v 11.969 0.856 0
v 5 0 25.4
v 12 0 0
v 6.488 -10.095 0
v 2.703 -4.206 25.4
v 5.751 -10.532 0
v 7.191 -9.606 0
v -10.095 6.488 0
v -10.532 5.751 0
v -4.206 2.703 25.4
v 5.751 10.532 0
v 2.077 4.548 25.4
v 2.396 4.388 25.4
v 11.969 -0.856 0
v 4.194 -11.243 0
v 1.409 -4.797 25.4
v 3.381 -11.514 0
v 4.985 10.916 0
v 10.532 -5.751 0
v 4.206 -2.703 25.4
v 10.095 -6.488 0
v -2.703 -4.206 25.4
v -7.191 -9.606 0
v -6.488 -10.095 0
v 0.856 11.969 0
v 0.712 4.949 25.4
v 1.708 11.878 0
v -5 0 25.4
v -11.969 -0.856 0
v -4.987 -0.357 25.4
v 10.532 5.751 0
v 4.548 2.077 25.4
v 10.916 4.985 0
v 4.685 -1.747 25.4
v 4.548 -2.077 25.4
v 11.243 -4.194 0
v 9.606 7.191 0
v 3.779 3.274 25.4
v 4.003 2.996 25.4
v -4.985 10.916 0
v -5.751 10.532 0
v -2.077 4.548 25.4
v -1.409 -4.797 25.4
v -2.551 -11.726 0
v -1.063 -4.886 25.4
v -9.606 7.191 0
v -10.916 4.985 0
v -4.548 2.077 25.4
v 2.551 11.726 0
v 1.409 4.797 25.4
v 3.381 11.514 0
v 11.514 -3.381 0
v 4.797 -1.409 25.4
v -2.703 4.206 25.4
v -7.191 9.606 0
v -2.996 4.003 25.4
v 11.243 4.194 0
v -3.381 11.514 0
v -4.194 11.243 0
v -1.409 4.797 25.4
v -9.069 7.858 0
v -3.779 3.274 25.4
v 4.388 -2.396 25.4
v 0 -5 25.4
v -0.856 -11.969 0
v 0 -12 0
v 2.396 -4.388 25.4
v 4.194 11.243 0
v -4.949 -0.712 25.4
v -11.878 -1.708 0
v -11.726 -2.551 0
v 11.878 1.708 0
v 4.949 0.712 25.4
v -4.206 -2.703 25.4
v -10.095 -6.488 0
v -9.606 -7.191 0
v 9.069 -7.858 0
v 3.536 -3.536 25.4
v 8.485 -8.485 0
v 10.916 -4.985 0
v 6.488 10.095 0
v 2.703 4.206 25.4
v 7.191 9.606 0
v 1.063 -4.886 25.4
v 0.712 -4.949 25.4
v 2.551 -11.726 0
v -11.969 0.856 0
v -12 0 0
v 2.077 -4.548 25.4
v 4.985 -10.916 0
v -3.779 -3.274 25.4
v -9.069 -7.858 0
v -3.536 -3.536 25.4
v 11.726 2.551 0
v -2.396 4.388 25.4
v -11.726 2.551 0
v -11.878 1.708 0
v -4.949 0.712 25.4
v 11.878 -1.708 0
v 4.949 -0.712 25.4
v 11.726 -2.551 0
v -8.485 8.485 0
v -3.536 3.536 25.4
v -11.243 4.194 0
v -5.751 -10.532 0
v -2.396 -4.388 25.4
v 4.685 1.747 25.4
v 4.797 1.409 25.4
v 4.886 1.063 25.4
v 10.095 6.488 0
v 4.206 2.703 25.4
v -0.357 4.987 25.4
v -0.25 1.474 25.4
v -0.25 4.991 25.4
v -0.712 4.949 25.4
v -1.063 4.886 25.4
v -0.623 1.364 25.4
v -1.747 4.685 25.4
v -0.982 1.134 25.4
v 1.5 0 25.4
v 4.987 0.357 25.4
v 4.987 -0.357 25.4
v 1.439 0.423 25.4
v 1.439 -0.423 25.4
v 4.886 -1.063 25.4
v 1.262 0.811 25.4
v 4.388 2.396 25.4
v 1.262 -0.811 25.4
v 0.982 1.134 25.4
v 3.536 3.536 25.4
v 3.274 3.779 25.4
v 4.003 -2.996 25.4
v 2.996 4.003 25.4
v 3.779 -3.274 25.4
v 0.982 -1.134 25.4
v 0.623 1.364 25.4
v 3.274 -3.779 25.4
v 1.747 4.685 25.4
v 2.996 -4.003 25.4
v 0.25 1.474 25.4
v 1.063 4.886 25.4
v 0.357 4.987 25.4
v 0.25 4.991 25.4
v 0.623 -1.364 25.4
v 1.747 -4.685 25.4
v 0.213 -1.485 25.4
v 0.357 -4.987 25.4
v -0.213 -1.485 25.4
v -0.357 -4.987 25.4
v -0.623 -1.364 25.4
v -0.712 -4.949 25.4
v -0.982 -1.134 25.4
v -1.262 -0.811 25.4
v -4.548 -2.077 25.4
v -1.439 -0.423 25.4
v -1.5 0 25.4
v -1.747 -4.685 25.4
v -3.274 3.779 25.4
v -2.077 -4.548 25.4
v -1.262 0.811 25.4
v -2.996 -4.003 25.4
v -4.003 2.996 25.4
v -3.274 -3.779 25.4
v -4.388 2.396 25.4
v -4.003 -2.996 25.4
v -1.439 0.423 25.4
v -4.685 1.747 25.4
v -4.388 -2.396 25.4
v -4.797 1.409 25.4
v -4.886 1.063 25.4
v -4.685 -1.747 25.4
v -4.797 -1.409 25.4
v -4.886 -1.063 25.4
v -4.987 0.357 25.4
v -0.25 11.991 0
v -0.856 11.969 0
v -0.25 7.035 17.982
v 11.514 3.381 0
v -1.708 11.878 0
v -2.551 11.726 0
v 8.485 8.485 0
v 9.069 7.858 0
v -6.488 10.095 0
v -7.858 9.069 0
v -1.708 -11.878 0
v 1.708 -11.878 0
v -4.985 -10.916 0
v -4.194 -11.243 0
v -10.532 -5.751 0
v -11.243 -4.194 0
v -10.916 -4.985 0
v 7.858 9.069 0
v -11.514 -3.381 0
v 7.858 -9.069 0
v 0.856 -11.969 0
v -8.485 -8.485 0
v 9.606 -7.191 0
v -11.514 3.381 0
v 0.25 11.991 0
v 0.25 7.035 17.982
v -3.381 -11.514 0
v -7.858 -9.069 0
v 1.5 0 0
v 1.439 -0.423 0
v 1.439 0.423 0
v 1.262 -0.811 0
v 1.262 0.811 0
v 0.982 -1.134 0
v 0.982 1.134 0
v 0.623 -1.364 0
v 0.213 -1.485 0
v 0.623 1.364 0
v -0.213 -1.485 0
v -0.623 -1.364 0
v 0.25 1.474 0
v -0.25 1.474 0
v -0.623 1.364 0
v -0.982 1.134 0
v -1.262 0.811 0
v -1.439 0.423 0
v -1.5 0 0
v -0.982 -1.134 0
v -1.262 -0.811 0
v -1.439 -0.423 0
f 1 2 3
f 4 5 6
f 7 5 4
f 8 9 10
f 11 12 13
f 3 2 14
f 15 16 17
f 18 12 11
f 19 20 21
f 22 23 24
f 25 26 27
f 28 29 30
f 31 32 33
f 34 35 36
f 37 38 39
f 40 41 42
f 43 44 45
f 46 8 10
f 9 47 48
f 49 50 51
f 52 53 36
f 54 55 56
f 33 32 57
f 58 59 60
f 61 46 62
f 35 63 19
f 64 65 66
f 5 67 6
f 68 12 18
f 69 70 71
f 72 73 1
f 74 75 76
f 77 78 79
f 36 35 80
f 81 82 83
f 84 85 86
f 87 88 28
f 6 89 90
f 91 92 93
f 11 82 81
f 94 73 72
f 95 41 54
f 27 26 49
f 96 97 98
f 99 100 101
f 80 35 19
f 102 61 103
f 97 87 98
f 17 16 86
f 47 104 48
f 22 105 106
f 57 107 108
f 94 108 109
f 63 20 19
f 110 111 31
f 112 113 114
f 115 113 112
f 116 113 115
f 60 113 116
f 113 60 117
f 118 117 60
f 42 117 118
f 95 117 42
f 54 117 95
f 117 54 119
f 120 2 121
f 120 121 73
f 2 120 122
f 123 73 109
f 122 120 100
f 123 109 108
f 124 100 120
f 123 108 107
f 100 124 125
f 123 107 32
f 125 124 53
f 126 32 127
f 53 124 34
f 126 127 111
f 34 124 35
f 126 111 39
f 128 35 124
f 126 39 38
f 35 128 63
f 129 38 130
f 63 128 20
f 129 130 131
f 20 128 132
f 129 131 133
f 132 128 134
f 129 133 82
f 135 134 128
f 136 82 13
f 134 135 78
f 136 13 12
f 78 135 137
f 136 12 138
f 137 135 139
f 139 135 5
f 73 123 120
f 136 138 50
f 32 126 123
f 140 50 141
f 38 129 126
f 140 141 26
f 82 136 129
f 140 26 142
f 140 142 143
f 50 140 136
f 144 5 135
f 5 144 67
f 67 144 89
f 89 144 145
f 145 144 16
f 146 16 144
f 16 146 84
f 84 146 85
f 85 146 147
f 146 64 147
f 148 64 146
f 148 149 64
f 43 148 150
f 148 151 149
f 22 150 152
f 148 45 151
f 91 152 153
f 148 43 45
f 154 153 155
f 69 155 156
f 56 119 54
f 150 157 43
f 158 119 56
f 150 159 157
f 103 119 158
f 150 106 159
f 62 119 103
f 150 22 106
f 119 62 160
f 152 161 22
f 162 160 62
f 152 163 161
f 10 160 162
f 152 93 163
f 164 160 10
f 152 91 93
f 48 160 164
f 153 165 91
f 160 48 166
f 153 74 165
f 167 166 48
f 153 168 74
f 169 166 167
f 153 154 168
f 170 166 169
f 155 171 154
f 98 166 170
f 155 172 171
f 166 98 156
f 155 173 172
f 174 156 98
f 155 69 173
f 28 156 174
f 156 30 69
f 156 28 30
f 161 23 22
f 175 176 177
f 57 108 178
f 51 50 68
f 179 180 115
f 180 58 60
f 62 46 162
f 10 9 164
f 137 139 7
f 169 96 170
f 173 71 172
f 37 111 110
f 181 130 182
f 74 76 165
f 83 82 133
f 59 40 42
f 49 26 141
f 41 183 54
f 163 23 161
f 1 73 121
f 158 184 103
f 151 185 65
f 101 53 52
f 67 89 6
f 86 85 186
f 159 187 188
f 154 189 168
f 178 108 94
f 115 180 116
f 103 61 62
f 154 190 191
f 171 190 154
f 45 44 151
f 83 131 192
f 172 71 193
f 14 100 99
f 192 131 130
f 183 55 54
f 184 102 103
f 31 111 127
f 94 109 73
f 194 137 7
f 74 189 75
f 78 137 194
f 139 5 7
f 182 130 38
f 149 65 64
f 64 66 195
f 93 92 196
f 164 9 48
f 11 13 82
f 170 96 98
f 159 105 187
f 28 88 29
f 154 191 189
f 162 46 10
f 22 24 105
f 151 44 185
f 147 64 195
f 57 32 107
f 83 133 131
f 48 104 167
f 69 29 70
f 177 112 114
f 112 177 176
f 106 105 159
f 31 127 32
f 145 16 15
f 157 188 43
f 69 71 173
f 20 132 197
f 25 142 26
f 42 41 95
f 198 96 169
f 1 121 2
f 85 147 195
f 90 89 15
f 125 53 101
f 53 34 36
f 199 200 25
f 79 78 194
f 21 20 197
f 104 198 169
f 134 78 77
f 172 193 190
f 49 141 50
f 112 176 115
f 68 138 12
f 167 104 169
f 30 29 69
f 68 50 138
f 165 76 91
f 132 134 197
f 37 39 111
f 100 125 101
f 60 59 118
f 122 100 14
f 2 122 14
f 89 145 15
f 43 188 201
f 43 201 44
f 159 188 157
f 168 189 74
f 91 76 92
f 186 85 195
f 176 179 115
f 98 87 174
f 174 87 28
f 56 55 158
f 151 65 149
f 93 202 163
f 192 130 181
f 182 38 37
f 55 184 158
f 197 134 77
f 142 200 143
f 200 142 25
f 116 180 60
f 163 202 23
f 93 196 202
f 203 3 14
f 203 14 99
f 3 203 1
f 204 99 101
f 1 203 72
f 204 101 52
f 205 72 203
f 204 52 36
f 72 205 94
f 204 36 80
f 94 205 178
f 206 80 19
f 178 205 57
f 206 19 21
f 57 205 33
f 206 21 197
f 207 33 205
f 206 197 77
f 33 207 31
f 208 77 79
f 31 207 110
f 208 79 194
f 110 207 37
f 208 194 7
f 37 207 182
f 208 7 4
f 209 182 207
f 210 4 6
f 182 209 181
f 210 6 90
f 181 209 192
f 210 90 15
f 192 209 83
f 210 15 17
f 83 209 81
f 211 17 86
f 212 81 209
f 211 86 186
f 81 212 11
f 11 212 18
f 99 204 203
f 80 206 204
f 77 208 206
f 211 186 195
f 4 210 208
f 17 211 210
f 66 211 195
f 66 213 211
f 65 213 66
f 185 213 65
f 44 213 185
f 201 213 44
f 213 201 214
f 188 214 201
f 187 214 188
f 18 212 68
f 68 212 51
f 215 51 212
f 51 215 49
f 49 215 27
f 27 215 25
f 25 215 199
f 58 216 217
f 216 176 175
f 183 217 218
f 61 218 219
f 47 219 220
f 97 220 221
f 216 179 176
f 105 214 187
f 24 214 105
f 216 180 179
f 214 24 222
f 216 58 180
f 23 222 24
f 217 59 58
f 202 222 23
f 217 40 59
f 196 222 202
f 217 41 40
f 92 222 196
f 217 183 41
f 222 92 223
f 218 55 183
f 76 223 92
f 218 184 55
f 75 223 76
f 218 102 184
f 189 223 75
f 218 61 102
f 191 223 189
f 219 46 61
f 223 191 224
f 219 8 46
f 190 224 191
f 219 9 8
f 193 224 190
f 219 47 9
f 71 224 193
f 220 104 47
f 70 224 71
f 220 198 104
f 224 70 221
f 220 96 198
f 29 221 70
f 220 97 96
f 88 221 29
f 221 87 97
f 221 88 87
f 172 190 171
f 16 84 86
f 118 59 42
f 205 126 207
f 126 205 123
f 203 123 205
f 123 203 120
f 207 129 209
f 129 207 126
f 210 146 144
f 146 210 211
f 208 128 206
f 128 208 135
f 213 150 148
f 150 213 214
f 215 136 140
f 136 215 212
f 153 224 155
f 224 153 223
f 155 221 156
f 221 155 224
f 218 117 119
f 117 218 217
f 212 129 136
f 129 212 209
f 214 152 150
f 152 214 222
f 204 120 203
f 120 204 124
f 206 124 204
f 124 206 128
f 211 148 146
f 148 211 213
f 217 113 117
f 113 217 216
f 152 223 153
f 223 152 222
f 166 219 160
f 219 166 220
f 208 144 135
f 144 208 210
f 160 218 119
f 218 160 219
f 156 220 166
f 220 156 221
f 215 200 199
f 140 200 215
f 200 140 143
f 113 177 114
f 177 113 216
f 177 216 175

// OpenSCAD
//======================================================================
// WallPlug.scad
//
// Plug for passing cable through wall.
//
// DrTomFlint 9 April 2023
//
//======================================================================


//----------------------------------------------------------------------
module plug1(){

	difference(){
		// main body
		cylinder(r1=12,r2=5.0,h=25.4,$fn=88);
		// bore for fiber optic cable
		cylinder(r=1.5,h=70,center=true,$fn=22);
		// slot for inserting cable
		translate([-0.25,0,-1])
		cube([0.5,30,30]);
	}
	
}

//======================================================================

plug1();

//======================================================================
